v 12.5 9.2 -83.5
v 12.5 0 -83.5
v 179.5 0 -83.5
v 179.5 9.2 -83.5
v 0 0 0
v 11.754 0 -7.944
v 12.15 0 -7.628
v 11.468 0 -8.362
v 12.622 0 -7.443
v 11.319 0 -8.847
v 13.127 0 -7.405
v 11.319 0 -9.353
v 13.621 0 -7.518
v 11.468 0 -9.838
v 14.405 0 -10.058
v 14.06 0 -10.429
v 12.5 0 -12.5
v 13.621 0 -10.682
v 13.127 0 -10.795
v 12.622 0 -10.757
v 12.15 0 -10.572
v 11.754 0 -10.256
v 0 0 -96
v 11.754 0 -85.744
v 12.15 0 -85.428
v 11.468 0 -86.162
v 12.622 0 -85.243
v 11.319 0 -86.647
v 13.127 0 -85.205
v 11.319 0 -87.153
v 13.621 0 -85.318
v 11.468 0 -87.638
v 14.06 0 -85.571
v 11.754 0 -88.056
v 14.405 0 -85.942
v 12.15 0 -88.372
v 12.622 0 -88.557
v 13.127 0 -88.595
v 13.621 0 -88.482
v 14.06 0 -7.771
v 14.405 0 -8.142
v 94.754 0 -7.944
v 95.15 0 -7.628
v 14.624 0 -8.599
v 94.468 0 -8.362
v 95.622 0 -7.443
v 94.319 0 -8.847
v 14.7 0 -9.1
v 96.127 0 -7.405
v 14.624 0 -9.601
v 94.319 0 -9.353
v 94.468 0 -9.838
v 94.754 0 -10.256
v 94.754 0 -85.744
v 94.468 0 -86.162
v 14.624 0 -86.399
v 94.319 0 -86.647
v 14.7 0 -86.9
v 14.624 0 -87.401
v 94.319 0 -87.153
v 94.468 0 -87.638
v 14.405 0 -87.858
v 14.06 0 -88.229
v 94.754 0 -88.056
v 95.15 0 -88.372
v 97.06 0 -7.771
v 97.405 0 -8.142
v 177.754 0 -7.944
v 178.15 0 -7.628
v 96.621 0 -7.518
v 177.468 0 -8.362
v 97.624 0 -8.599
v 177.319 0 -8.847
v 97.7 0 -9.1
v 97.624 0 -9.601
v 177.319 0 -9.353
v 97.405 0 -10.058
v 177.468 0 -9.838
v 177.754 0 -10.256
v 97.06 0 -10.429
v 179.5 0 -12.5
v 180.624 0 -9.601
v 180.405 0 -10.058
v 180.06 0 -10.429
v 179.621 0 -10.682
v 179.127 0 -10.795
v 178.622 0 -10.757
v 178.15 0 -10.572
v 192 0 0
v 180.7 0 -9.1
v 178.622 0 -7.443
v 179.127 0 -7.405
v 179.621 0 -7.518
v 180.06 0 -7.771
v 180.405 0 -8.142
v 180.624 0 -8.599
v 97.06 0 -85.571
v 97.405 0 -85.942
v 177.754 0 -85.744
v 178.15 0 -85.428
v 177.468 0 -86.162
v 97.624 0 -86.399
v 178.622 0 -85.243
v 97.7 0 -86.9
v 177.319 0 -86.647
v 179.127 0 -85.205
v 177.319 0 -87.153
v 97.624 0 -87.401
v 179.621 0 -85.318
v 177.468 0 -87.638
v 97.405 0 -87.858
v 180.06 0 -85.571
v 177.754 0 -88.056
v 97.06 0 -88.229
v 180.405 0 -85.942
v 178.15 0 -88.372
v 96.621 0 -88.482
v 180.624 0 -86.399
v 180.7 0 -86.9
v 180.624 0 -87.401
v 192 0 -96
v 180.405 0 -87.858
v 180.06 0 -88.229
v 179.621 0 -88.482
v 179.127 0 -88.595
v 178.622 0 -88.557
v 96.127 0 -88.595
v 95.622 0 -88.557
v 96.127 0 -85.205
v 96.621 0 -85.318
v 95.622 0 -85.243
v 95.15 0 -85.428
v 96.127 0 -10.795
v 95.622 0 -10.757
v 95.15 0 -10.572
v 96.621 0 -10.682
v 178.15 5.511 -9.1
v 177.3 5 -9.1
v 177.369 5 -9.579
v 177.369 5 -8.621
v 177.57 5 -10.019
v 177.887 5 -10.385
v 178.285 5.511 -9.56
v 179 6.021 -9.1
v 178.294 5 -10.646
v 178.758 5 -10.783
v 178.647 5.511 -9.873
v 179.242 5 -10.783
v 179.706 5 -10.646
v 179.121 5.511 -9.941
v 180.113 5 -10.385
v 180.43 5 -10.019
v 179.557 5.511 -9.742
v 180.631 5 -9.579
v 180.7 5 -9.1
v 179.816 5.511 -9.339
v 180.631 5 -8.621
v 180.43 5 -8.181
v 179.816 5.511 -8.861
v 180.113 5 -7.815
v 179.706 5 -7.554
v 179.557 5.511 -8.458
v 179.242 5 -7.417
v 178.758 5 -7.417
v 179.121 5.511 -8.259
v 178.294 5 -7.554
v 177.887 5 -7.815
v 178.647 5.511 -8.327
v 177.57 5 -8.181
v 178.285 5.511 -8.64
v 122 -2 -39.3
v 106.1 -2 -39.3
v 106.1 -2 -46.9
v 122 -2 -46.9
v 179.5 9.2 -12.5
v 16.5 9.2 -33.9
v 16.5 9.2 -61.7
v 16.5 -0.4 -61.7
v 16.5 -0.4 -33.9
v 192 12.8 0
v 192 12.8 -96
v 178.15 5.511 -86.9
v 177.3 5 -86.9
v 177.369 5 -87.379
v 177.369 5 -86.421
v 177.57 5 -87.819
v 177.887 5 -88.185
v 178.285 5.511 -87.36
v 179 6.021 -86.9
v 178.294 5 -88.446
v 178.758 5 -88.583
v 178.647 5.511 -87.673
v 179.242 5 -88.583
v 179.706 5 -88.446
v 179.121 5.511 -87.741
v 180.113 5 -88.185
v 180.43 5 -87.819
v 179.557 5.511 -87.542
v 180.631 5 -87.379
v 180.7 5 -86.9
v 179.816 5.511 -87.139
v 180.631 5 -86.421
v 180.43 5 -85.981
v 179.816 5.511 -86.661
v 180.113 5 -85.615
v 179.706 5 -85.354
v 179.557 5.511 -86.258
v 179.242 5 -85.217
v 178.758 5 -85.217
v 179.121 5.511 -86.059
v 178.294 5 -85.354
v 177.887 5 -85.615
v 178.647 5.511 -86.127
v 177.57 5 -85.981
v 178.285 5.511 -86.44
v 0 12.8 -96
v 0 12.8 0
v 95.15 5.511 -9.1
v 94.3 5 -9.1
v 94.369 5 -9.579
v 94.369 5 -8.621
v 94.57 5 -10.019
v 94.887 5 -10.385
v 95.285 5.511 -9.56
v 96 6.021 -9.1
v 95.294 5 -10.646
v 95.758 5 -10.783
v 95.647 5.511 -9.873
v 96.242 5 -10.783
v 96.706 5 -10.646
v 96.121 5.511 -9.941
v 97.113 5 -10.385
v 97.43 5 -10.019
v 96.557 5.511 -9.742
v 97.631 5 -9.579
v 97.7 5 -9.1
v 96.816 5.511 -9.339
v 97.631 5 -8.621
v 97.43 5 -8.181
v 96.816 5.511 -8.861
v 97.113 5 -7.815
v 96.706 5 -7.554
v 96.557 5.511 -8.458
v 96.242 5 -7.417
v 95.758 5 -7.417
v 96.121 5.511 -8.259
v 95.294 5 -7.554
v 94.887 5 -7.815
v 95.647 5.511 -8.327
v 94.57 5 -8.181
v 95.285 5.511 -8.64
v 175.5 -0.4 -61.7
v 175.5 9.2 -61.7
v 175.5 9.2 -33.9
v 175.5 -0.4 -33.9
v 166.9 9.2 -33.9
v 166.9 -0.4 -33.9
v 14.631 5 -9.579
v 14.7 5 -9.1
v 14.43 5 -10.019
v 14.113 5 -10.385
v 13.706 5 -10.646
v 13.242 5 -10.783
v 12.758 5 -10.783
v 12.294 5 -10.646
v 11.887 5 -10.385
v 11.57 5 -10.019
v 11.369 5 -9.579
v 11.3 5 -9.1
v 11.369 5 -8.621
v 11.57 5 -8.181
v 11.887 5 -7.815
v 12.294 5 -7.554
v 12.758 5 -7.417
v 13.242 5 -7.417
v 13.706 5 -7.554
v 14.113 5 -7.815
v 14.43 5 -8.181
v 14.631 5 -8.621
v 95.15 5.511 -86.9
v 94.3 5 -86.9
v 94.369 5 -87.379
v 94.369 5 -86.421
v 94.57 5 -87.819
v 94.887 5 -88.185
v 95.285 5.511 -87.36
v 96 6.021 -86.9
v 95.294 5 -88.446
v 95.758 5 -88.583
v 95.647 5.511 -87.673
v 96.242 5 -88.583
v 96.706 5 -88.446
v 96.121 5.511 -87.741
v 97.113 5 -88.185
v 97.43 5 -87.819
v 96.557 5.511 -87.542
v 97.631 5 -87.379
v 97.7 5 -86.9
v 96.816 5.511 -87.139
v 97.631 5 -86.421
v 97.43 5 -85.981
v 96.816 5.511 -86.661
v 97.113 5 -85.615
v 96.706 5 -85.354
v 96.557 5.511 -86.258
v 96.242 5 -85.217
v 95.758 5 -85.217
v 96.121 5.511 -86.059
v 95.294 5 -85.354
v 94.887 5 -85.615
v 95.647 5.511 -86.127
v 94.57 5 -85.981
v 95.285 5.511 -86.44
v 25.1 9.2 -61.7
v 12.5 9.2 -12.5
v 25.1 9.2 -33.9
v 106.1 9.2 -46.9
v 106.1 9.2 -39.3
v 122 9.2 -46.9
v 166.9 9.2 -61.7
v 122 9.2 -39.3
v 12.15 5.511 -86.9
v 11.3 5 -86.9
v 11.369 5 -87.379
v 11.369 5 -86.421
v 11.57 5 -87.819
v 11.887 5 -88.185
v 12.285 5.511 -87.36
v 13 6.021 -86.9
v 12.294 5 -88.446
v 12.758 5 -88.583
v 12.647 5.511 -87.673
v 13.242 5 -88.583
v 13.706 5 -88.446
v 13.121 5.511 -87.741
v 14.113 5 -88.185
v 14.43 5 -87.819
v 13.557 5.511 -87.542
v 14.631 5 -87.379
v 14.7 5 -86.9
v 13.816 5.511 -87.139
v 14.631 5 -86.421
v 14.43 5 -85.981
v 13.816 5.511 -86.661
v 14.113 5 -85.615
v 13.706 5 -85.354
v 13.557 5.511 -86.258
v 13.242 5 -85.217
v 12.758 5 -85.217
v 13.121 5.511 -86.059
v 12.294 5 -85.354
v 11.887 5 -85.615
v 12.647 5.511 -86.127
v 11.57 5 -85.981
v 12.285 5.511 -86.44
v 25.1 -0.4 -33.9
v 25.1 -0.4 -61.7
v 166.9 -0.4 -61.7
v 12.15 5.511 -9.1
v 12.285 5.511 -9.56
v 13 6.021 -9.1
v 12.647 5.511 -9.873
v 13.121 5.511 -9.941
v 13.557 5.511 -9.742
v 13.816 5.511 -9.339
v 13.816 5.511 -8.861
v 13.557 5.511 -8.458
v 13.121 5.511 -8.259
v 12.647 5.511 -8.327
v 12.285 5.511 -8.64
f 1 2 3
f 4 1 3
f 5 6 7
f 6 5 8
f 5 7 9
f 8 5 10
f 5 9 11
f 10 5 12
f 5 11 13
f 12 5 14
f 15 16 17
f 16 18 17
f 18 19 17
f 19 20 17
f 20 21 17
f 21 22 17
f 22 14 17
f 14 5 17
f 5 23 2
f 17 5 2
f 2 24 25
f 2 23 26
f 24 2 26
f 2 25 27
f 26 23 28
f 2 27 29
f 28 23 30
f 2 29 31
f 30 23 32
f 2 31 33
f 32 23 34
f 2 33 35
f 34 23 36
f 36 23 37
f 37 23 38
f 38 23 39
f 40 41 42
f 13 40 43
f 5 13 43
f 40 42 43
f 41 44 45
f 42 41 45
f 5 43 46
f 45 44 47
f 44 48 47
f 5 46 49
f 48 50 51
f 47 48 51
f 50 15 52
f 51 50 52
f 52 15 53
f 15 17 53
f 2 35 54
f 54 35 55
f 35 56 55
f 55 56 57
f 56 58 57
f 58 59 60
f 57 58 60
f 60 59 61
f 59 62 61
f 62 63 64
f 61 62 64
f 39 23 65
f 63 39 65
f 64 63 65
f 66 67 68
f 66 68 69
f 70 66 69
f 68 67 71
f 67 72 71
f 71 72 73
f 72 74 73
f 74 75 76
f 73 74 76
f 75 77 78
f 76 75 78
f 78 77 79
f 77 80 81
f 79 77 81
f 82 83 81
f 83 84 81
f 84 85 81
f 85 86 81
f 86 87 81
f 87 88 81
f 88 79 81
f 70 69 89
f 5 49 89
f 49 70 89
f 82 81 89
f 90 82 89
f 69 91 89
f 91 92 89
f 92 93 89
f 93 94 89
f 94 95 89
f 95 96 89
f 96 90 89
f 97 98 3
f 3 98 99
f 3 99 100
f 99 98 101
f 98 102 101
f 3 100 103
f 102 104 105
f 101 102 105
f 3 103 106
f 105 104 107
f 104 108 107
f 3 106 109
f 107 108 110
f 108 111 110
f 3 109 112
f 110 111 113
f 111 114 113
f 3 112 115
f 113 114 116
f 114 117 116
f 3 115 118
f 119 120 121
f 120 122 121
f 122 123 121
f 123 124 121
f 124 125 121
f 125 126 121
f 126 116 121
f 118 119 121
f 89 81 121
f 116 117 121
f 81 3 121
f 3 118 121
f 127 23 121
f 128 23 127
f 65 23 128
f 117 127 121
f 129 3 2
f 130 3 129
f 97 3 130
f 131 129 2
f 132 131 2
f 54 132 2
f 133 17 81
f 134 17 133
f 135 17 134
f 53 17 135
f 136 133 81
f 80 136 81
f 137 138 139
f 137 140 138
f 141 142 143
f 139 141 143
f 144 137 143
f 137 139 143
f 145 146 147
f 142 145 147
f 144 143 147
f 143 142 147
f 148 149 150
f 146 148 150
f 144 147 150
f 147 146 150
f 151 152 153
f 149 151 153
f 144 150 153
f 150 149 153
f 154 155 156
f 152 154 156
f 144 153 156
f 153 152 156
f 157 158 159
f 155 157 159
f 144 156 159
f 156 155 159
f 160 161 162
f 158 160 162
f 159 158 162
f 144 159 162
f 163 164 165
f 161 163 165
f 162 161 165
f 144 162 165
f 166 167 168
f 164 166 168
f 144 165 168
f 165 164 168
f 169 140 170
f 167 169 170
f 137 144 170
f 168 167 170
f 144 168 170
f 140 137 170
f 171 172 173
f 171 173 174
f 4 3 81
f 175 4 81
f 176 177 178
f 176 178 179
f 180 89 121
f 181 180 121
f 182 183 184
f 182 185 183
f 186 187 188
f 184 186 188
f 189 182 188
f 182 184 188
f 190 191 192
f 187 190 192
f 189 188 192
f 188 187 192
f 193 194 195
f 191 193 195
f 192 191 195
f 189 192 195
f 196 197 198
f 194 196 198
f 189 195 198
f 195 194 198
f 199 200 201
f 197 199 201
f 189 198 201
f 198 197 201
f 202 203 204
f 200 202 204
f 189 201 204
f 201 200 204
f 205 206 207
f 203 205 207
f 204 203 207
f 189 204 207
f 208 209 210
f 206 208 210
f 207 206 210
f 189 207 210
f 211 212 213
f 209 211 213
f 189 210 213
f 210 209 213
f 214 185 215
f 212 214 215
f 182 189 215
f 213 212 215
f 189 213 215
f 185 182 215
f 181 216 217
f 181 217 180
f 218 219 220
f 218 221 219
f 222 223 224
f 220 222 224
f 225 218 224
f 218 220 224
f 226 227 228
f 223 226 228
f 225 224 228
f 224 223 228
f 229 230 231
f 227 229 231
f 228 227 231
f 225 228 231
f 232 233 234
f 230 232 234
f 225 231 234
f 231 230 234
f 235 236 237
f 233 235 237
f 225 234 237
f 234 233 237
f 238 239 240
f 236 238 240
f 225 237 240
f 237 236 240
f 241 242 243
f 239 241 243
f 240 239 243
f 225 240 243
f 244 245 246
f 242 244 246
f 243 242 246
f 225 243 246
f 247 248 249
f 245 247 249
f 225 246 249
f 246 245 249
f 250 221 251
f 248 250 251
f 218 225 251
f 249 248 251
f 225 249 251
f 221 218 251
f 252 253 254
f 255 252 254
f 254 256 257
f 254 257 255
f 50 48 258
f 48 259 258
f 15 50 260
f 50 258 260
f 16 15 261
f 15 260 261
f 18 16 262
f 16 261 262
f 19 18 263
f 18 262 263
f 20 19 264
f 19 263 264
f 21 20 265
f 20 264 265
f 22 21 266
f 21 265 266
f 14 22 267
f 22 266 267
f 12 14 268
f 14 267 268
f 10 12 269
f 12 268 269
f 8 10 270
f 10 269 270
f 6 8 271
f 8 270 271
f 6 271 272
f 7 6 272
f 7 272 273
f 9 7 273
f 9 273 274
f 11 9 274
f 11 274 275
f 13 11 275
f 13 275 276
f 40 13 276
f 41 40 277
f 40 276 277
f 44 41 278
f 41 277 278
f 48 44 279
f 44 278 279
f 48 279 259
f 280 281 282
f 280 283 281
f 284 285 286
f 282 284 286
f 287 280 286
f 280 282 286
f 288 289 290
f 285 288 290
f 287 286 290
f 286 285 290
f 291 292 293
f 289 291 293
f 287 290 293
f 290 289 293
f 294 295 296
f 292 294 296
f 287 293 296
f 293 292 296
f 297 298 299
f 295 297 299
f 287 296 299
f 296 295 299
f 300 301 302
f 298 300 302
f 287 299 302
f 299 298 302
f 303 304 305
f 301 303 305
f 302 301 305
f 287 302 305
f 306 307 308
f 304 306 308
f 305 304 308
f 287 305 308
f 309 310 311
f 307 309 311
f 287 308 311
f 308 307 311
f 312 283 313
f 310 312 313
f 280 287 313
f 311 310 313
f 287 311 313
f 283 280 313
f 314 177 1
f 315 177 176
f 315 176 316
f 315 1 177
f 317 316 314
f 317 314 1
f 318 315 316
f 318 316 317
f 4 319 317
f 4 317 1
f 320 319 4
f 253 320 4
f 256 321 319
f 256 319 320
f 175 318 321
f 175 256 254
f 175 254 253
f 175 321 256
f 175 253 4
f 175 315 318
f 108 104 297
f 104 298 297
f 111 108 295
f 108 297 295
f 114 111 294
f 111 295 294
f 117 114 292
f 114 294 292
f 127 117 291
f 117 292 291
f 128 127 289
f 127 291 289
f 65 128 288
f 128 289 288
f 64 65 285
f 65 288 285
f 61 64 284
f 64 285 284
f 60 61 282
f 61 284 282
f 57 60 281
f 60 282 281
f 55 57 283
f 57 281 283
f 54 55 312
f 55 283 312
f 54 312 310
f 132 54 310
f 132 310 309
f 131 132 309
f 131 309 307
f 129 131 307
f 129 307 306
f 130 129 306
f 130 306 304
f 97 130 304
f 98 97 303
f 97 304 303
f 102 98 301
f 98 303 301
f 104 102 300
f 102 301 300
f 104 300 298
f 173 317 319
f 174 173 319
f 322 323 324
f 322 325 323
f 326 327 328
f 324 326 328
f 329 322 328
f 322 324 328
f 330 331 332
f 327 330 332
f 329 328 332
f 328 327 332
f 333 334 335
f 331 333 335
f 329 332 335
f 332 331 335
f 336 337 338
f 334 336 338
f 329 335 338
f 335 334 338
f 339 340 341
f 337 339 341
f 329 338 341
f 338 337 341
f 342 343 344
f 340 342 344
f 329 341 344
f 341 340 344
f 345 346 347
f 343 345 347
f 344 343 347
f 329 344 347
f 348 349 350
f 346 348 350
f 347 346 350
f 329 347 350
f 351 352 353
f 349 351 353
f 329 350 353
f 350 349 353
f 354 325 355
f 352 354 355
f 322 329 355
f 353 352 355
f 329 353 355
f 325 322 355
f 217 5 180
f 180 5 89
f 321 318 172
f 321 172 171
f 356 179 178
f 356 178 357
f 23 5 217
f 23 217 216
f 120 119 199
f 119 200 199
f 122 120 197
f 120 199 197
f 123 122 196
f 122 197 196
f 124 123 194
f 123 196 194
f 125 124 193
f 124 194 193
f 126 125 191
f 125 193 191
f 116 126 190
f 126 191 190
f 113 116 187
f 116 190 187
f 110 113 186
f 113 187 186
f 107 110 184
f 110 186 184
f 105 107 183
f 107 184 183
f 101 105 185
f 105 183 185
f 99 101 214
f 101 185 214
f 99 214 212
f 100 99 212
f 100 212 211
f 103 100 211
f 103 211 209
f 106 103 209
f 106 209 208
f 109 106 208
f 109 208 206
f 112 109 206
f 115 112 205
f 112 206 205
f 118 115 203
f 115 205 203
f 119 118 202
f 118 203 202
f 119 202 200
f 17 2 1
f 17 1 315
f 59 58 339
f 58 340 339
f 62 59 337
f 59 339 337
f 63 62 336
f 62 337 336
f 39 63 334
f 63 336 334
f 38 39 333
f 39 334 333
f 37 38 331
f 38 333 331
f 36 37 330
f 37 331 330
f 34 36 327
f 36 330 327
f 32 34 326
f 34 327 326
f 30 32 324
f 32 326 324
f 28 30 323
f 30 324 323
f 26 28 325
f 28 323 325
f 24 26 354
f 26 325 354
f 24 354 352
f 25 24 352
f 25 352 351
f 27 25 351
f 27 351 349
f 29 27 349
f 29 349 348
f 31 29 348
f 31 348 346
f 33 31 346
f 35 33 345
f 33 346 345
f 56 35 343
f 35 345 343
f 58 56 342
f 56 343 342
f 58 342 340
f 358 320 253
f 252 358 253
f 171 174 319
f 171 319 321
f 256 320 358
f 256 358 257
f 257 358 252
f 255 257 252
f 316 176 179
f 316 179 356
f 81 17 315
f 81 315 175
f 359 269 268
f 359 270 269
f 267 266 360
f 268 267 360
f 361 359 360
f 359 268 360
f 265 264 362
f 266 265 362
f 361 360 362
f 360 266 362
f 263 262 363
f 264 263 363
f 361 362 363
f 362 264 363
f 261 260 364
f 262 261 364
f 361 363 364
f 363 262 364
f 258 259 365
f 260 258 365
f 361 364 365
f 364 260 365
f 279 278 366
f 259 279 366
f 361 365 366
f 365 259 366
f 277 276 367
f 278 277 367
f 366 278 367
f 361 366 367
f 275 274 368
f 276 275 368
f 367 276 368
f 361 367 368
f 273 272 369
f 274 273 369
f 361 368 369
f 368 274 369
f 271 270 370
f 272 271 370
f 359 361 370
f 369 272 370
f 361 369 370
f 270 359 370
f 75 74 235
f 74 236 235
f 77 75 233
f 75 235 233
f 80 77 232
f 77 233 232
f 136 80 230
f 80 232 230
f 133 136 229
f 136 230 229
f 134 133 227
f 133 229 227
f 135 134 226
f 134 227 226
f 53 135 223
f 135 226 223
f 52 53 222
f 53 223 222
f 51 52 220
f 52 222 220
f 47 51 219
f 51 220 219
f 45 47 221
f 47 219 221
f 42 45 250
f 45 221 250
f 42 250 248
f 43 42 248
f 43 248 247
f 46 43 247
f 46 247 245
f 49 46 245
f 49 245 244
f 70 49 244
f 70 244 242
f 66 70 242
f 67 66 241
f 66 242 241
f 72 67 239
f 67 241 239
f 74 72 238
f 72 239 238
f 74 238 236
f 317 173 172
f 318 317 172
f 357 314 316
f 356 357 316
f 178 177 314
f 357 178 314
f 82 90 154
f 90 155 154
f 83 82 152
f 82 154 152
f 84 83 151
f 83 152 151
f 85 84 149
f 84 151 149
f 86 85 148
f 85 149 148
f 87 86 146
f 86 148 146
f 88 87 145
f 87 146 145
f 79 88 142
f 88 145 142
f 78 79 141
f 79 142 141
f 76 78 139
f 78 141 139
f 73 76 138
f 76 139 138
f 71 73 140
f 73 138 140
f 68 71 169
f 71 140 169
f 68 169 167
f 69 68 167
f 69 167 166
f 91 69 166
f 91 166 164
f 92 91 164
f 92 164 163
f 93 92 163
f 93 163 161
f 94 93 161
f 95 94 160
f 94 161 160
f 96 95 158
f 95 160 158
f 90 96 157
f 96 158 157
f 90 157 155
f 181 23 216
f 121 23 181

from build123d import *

# Parameters (mm, degrees)
SKETCH1_W                = 192
SKETCH1_H                = 96
BOSS_EXTRUDE1_DEPTH      = 12.8
SKETCH2_W                = 167
SKETCH2_H                = 71
CUT_EXTRUDE1_DEPTH       = 9.2
M3_CLEARANCE_HOLE1_D     = 3.4
M3_CLEARANCE_HOLE1_DEPTH = 5
M3_CLEARANCE_HOLE1_TIP   = 1.021463052
SKETCH6_W                = 8.6
SKETCH6_H                = 27.8
BOSS_EXTRUDE2_DEPTH      = 9.6
SKETCH7_W                = 15.9
SKETCH7_H                = 7.6
BOSS_EXTRUDE3_DEPTH      = 11.2


with BuildPart() as part:
    # Sketch1 → Boss-Extrude1 (new body)
    with BuildSketch(Plane(origin=(0, 0, 0), x_dir=(1, 0, 0), z_dir=(0, 1, 0))):
        with Locations((96, 48)):
            Rectangle(SKETCH1_W, SKETCH1_H)
    extrude(amount=BOSS_EXTRUDE1_DEPTH)

    # Sketch2 → Cut-Extrude1 (cut)
    with BuildSketch(Plane.XZ):
        with Locations((96, -48)):
            Rectangle(SKETCH2_W, SKETCH2_H)
    extrude(amount=-CUT_EXTRUDE1_DEPTH, mode=Mode.SUBTRACT)

    # M3 Clearance Hole1
    with Locations(Plane(origin=(0, 0, 0), x_dir=(-1, 0, 0), z_dir=(0, -1, 0))):
        with Locations((-13, 9.1), (-96, 9.1), (-179, 9.1), (-179, 86.9), (-96, 86.9), (-13, 86.9)):
            Hole(M3_CLEARANCE_HOLE1_D / 2, depth=M3_CLEARANCE_HOLE1_DEPTH)
            with Locations((0, 0, -(M3_CLEARANCE_HOLE1_DEPTH + M3_CLEARANCE_HOLE1_TIP / 2))):  # 118° drill point
                Cone(0, M3_CLEARANCE_HOLE1_D / 2, M3_CLEARANCE_HOLE1_TIP, mode=Mode.SUBTRACT)

    # Sketch6 → Boss-Extrude2 (add)
    with BuildSketch(Plane.XZ.offset(-9.2)):
        with Locations((20.8, -47.8)):
            Rectangle(SKETCH6_W, SKETCH6_H)
        with Locations((171.2, -47.8)):
            Rectangle(SKETCH6_W, SKETCH6_H)
    extrude(amount=BOSS_EXTRUDE2_DEPTH)

    # Sketch7 → Boss-Extrude3 (add)
    with BuildSketch(Plane.XZ.offset(-9.2)):
        with Locations((114.05, -43.1)):
            Rectangle(SKETCH7_W, SKETCH7_H)
    extrude(amount=BOSS_EXTRUDE3_DEPTH)


solid = part.part
